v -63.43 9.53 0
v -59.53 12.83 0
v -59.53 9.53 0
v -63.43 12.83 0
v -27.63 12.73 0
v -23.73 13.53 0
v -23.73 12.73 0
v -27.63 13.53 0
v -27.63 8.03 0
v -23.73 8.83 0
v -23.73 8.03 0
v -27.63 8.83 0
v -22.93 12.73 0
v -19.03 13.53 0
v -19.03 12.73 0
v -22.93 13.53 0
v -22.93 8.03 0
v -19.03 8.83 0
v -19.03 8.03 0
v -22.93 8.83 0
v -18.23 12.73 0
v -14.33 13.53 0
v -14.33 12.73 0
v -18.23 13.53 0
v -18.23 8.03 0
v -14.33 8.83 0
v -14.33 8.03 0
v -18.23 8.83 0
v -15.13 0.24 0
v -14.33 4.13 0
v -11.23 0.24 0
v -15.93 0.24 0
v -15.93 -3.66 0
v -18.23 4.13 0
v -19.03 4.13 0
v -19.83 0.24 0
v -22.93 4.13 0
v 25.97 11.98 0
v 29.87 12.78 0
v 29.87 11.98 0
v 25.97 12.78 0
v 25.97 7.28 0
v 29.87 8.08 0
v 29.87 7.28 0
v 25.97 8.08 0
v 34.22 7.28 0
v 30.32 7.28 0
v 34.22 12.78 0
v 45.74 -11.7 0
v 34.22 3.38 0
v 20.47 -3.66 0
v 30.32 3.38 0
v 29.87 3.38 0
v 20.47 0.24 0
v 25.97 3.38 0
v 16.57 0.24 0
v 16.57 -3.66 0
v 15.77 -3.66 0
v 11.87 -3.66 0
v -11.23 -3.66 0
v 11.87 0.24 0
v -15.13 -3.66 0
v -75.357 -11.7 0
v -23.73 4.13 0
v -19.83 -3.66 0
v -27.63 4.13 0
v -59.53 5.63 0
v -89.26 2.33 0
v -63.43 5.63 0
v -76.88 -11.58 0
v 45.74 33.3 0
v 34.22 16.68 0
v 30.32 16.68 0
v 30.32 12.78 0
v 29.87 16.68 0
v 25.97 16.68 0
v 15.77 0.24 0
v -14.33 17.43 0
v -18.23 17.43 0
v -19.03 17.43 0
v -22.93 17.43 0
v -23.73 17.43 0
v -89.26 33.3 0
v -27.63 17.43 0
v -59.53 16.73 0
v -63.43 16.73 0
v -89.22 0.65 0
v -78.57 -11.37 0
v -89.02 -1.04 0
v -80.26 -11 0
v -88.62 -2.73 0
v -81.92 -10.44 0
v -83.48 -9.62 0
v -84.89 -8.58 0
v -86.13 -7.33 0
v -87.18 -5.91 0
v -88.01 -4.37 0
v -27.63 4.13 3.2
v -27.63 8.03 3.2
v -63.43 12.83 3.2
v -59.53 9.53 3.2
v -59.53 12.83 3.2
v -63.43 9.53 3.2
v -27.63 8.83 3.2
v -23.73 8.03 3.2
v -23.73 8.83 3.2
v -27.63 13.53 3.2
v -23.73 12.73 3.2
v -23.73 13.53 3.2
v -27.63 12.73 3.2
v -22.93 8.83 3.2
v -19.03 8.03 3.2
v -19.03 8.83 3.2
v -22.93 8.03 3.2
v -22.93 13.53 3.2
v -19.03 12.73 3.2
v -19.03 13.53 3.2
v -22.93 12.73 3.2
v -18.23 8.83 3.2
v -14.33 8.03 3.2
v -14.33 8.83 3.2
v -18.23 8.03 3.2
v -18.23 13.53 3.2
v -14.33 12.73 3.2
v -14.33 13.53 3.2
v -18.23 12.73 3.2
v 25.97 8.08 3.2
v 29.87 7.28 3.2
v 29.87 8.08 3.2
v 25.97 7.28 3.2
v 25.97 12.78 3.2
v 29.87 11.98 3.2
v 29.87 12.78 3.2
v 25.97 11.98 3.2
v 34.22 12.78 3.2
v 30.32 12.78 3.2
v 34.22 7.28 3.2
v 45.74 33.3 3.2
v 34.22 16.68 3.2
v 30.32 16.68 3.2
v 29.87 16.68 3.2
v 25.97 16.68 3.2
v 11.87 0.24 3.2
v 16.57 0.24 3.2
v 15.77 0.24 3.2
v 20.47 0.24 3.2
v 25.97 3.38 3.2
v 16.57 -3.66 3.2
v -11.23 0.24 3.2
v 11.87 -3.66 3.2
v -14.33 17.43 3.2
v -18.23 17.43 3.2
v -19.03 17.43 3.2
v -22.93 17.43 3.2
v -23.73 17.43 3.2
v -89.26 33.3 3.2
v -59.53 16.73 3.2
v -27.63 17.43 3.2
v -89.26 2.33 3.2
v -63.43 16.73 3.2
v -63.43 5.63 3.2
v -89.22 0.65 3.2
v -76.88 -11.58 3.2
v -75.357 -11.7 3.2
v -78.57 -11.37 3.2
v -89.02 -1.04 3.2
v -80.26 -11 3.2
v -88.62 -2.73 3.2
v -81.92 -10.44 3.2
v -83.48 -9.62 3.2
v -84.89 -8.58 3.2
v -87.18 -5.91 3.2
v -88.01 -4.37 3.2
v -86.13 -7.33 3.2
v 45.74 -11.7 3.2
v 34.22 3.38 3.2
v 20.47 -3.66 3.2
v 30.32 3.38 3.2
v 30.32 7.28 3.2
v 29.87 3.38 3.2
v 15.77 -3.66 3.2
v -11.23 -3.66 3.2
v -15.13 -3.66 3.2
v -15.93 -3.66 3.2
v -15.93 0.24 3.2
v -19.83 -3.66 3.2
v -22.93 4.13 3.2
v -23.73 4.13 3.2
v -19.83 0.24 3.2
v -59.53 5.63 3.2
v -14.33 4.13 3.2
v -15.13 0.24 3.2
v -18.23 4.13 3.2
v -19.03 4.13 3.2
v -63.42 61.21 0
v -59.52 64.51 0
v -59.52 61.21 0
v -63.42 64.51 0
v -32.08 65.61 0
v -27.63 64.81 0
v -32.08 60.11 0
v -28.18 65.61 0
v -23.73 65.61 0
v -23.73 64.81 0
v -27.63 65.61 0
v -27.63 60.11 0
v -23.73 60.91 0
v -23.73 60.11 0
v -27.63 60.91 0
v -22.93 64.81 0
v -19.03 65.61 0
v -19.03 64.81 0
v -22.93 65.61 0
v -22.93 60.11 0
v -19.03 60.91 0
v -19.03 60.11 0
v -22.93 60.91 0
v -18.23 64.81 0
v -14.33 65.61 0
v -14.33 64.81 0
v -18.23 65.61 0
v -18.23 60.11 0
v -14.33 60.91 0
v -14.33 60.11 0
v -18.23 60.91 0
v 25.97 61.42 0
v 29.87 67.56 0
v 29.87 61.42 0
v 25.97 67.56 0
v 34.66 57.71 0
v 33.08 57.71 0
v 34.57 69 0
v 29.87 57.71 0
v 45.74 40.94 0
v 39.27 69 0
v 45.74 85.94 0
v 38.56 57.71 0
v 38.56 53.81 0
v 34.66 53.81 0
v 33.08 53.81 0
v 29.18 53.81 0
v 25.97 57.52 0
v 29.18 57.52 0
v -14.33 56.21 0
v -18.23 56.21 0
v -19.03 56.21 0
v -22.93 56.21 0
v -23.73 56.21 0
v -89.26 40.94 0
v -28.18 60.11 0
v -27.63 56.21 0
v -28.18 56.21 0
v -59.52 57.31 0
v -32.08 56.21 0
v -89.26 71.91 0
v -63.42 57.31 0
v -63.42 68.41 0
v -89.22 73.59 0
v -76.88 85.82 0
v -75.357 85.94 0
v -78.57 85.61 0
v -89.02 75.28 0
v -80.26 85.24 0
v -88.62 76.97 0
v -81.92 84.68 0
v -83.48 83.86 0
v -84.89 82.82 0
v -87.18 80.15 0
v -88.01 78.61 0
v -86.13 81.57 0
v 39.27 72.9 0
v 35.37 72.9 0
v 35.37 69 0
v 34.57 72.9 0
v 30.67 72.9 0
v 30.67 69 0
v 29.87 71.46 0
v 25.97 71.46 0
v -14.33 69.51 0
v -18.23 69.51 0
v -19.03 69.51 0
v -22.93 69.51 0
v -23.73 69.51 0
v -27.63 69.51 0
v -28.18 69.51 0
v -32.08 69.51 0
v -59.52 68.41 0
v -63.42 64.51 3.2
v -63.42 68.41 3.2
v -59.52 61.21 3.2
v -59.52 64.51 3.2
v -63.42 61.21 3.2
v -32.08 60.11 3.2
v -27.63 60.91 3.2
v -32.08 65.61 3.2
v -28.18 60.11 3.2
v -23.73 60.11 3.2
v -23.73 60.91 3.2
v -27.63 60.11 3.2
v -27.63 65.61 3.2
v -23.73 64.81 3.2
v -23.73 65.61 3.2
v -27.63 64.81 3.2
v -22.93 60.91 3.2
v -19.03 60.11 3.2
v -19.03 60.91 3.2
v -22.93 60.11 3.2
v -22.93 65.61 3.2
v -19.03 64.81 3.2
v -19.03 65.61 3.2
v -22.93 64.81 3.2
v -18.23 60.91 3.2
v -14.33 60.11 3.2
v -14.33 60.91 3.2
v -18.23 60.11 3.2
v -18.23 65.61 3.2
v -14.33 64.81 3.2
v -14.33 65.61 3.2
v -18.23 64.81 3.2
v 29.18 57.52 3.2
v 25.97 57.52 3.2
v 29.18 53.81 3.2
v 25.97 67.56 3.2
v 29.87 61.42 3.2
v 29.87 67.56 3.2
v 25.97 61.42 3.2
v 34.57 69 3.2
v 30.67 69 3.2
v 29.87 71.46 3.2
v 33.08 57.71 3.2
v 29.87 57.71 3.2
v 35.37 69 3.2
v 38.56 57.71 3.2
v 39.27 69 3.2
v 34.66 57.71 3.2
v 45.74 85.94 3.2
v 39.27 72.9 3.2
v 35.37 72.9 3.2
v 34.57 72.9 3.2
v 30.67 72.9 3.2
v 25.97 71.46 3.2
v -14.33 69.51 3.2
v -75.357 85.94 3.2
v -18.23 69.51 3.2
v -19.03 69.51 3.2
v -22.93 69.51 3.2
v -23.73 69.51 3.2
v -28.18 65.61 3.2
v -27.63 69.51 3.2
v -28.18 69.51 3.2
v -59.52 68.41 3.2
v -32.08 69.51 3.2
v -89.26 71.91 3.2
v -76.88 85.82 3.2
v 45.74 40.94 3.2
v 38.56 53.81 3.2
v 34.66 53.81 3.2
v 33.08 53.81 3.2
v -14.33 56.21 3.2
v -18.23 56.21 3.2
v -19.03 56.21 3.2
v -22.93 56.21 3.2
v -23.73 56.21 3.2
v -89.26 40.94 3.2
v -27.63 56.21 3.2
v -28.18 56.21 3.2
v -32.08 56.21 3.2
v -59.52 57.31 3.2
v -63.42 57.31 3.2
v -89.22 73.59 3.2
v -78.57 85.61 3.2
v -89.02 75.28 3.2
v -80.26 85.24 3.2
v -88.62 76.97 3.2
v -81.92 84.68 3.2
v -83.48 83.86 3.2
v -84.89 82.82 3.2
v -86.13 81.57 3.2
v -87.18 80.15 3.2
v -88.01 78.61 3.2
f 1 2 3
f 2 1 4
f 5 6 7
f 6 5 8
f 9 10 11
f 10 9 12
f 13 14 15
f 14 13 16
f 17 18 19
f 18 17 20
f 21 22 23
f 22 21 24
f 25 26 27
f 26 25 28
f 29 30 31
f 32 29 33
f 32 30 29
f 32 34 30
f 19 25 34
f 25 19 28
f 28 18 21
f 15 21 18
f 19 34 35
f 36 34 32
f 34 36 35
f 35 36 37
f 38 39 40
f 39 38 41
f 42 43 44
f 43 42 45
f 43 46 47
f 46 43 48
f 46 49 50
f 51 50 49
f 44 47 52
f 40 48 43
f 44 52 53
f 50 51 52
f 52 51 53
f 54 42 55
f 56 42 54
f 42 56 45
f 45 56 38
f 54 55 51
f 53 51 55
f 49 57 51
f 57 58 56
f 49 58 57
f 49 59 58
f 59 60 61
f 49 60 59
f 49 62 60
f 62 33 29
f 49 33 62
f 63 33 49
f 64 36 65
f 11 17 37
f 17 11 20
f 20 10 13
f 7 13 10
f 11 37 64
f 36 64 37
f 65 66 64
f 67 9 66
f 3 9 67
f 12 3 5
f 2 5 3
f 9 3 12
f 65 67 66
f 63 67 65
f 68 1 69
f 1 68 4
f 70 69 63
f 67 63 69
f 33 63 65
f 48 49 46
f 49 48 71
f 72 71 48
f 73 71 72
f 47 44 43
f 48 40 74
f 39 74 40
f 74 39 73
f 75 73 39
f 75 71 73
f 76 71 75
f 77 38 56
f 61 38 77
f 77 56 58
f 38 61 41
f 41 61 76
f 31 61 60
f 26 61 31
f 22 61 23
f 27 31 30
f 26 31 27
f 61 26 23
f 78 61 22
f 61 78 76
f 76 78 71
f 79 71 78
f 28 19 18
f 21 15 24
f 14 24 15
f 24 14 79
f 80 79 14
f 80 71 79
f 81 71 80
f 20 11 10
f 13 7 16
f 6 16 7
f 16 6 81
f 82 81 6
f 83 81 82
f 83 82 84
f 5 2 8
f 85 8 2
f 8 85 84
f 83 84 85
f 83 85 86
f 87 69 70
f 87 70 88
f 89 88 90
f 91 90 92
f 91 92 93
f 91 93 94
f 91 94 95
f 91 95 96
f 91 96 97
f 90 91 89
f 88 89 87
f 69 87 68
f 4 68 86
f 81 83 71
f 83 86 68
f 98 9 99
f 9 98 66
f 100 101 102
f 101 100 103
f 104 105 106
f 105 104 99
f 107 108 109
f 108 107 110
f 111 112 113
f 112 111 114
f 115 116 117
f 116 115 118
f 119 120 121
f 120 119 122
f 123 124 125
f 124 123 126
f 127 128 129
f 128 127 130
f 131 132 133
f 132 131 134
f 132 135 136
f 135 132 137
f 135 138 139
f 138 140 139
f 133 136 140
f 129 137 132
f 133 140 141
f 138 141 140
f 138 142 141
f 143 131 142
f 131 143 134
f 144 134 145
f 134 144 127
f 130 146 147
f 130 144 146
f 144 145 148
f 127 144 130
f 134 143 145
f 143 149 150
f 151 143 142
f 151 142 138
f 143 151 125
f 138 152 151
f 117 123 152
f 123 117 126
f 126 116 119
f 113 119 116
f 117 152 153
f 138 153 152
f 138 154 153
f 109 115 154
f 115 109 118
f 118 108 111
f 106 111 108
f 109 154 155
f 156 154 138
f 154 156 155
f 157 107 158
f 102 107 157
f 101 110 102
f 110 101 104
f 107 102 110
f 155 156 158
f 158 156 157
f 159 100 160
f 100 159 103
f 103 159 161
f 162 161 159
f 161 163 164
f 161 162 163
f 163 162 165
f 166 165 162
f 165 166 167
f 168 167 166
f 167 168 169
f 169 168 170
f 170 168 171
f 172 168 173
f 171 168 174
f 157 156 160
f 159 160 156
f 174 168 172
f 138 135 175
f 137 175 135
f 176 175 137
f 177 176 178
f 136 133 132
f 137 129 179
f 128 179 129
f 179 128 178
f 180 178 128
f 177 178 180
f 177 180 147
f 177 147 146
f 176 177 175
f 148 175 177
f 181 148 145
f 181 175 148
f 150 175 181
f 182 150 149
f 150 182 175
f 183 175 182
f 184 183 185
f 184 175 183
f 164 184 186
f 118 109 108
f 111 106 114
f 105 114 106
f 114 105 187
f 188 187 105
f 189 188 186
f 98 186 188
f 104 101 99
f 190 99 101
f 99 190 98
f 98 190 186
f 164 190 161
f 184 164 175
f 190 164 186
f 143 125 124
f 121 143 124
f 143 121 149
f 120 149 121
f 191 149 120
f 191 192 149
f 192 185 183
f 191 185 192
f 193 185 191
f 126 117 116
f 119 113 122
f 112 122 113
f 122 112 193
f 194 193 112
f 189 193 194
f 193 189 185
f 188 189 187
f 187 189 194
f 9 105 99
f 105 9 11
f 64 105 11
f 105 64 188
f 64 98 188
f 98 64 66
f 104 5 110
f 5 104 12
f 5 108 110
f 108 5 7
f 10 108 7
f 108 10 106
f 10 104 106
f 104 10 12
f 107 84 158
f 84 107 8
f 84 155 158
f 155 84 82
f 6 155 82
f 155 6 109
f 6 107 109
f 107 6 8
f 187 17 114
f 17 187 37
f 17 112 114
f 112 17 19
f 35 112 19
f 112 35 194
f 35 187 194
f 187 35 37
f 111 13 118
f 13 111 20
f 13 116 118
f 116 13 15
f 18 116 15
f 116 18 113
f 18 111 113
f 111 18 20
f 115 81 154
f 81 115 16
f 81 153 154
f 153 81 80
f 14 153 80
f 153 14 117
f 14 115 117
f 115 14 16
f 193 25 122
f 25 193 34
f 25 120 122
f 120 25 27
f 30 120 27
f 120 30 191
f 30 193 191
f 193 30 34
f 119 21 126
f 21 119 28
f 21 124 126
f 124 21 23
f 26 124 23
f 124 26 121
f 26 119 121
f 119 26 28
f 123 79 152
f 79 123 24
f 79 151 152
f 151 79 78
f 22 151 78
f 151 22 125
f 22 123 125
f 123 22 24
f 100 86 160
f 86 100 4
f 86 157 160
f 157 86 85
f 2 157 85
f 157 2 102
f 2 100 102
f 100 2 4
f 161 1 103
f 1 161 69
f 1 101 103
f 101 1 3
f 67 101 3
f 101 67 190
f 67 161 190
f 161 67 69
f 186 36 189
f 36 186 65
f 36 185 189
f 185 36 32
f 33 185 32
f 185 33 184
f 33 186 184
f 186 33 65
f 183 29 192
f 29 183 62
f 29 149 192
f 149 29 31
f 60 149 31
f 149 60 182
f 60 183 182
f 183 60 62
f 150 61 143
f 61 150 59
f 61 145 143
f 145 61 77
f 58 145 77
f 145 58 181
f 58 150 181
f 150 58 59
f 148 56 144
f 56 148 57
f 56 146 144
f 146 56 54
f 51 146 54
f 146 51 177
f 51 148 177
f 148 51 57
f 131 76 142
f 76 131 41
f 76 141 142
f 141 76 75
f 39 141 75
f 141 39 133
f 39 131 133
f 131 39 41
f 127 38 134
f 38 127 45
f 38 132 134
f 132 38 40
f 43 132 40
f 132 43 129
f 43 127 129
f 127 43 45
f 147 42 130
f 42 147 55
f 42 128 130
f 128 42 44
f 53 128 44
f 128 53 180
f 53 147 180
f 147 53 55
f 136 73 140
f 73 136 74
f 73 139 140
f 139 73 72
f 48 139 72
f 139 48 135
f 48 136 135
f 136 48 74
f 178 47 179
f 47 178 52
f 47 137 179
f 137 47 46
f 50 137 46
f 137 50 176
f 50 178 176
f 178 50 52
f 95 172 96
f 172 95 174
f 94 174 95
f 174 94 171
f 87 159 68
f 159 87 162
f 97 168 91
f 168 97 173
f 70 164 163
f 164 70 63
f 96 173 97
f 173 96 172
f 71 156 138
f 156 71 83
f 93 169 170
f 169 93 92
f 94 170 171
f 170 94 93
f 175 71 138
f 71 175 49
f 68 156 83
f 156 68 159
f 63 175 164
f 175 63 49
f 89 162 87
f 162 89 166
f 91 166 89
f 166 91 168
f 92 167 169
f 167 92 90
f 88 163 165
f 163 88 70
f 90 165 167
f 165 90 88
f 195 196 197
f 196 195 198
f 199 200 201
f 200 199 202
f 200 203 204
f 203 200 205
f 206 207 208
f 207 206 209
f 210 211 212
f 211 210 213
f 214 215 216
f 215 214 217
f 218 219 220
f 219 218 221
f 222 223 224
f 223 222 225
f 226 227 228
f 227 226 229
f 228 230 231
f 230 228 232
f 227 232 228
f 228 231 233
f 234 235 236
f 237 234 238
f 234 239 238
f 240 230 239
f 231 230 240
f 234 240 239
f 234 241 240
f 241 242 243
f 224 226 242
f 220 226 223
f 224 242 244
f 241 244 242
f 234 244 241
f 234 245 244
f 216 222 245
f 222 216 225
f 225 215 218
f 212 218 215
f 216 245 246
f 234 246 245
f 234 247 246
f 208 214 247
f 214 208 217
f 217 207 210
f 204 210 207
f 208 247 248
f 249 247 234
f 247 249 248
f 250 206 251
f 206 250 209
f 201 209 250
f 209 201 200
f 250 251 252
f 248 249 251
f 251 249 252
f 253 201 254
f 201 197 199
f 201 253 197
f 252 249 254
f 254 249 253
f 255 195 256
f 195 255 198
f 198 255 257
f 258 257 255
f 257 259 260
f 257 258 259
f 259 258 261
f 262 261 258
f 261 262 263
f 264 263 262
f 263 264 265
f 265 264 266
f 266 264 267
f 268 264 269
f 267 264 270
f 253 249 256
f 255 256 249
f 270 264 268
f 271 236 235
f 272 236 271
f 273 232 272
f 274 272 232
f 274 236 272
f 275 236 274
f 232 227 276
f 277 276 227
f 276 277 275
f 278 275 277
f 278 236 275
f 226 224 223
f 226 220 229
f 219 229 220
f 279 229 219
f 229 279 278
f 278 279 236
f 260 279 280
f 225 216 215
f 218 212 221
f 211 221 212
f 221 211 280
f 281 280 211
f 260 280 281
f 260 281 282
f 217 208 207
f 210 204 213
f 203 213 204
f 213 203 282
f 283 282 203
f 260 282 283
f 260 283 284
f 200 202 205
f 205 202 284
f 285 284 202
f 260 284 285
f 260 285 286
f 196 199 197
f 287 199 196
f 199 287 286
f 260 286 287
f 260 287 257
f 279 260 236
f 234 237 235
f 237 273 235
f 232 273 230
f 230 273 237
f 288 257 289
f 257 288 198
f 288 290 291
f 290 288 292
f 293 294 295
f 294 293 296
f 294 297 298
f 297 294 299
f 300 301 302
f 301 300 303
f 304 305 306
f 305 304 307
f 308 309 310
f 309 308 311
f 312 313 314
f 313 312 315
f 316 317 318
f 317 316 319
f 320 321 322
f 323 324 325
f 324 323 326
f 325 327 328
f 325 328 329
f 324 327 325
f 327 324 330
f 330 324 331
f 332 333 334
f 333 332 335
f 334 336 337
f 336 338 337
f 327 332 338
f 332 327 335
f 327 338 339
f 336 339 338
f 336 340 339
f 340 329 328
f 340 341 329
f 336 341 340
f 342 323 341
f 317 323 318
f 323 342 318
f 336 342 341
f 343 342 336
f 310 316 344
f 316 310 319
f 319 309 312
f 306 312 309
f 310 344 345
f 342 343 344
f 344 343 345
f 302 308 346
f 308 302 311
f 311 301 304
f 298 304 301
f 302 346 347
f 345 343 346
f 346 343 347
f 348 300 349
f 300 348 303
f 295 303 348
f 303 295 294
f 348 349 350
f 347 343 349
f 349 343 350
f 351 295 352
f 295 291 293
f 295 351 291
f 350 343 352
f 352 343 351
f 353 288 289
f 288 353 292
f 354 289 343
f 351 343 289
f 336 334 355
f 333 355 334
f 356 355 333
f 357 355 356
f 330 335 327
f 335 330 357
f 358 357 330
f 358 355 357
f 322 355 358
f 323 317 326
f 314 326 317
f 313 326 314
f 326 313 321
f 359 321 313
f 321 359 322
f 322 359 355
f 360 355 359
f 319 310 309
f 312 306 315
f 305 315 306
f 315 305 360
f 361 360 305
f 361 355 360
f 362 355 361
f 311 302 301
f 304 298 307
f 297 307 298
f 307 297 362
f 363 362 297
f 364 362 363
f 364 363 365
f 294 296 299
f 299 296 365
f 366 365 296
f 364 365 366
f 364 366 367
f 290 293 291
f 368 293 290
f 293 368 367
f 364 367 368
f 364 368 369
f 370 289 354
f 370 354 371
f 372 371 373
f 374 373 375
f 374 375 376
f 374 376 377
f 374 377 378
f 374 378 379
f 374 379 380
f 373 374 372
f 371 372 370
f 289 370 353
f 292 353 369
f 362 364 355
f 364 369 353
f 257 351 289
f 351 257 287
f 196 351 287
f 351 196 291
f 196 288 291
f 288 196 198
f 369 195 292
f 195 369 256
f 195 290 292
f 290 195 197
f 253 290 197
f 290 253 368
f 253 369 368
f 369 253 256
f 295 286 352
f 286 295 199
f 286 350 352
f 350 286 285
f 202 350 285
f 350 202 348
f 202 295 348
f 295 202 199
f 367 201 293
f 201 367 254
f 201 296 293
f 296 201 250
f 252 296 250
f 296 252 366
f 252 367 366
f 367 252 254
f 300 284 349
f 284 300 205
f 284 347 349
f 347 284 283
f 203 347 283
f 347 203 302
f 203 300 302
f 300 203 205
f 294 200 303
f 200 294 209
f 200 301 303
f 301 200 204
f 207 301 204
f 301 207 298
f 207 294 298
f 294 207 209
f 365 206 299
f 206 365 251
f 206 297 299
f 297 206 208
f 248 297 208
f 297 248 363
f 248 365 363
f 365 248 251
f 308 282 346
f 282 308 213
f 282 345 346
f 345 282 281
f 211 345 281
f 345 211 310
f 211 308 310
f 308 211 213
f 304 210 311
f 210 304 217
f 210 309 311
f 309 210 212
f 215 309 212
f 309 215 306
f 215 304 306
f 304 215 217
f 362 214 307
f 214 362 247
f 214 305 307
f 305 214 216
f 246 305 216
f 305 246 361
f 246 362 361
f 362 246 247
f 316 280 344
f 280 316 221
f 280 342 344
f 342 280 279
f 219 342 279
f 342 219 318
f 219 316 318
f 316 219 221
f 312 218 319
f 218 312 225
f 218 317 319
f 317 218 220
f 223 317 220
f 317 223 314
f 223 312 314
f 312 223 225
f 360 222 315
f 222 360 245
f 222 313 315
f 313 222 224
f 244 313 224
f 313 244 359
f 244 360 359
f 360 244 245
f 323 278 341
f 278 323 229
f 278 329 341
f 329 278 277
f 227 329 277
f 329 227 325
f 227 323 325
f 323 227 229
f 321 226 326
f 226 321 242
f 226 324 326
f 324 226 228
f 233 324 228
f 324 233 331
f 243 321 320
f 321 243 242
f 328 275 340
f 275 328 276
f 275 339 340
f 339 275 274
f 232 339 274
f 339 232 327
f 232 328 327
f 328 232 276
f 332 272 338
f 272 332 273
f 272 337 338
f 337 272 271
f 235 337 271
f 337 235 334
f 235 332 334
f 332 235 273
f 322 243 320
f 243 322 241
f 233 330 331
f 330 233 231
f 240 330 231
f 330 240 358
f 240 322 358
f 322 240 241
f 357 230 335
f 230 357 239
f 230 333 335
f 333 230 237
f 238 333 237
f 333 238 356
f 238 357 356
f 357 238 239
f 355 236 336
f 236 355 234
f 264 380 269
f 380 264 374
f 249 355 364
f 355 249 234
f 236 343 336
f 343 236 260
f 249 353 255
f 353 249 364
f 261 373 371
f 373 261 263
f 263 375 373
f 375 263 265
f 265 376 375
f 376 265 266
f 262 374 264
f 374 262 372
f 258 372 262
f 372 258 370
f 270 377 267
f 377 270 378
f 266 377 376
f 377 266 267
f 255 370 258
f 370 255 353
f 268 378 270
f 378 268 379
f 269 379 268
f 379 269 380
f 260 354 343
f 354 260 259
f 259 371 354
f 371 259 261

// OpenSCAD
th = 3.2;

module corner() {
    translate([-18.79, -18.79]) polygon([
        [18.79, 0.0], [18.79, 1.56], [18.79, 3.13], [18.79, 4.76], 
        [18.75, 6.44], [18.55, 8.13], [18.15, 9.82], [17.54, 11.46], 
        [16.71, 13.0], [15.66, 14.42], [14.42, 15.67], [13.01, 16.71], 
        [11.45, 17.53], [9.79, 18.09], [8.1, 18.46], [6.41, 18.67], 
        [4.76, 18.8], [3.15, 18.86], [1.56, 18.86], [0.0, 18.79],
        [18.79, 18.79]
    ]);
}

module mag() {
    linear_extrude(3.2) square(3.9, center=true);
}

// ipad dimension: 178.52 x 247.64 mm
// smart connector center plate to the closest edge distance: 10 + 3.4/2 = 11.7mm

module lower_part_centered_plate_2d() {
    translate([-178.52/2,-11.7]) difference() {
        square([135, 45]);
        rotate(180) corner();
    }
}

module lower_part_magnets() {
    for (tx=[-25.68, -20.98, -16.28], ty=[6.08, 10.78, 15.48])
        translate([tx,ty]) mag(); // center 3x3
    for(ty=[14.78, 7.58])
        translate([-61.48,ty]) mag(); // left 1x2
    for(tx=[-17.88, -13.18, 13.82, 18.52])
        translate([tx,-1.71]) mag(); // bottom 4x1
    for(ty=[14.73, 10.03, 5.33])
        translate([27.92,ty]) mag(); // right1 1x3
    for(ty=[14.73, 5.33])
        translate([32.27,ty]) mag(); // right2 1x2
    for(ty=[14.73, 5.33])
        translate([57.62,ty]) mag(); // right3 1x2
    for(ty=[14.73, 10.03, 5.33])
        translate([62.02,ty]) mag(); // right4 1x3    
}

module lower_part(){
    difference() {
        linear_extrude(th) lower_part_centered_plate_2d();
        lower_part_magnets();
    }
}

//lower_part();

module upper_part_centered_plate_2d() {
    w = 45;// plate width
    translate([-178.52/2,247.64-11.7-w]) difference() {
        square([135, w]);
        translate([0,w]) mirror([0,1]) rotate(180) corner();
    }
}

module upper_part_magnets() {
    for(ty=[216.46, 209.26])
        translate([-61.47,ty]) mag(); // left1 1x2
    
    for(ty=[217.56, 208.16])
        translate([-30.13,ty]) mag(); // center1 1x2
    for(tx=[-25.68, -20.98, -16.28], ty=[217.56, 212.86, 208.16])
        translate([tx,ty]) mag(); //  center2 3x3
    
    for(ty=[219.51, 209.47])
        translate([27.92,ty]) mag(); // right1 1x2
    for(tx=[32.62, 37.32, 
        //42.02, 46.72, 51.77
    ])
        translate([tx, 220.95]) mag(); // right2 upper 5x1
    for(tx=[31.13, 36.61, 
        //42.08, 47.56, 52.74
    ])
        translate([tx, 205.76]) mag(); // right2 lower 5x1
}

module upper_part() {
    difference() {
        linear_extrude(th) upper_part_centered_plate_2d();
        upper_part_magnets();
    }
}  

//intersection() {
//    lower_part();
//    translate([-15,0,0]) cube([40,50,50], center=true);
//}
lower_part();
translate([0,-150,0]) upper_part();
